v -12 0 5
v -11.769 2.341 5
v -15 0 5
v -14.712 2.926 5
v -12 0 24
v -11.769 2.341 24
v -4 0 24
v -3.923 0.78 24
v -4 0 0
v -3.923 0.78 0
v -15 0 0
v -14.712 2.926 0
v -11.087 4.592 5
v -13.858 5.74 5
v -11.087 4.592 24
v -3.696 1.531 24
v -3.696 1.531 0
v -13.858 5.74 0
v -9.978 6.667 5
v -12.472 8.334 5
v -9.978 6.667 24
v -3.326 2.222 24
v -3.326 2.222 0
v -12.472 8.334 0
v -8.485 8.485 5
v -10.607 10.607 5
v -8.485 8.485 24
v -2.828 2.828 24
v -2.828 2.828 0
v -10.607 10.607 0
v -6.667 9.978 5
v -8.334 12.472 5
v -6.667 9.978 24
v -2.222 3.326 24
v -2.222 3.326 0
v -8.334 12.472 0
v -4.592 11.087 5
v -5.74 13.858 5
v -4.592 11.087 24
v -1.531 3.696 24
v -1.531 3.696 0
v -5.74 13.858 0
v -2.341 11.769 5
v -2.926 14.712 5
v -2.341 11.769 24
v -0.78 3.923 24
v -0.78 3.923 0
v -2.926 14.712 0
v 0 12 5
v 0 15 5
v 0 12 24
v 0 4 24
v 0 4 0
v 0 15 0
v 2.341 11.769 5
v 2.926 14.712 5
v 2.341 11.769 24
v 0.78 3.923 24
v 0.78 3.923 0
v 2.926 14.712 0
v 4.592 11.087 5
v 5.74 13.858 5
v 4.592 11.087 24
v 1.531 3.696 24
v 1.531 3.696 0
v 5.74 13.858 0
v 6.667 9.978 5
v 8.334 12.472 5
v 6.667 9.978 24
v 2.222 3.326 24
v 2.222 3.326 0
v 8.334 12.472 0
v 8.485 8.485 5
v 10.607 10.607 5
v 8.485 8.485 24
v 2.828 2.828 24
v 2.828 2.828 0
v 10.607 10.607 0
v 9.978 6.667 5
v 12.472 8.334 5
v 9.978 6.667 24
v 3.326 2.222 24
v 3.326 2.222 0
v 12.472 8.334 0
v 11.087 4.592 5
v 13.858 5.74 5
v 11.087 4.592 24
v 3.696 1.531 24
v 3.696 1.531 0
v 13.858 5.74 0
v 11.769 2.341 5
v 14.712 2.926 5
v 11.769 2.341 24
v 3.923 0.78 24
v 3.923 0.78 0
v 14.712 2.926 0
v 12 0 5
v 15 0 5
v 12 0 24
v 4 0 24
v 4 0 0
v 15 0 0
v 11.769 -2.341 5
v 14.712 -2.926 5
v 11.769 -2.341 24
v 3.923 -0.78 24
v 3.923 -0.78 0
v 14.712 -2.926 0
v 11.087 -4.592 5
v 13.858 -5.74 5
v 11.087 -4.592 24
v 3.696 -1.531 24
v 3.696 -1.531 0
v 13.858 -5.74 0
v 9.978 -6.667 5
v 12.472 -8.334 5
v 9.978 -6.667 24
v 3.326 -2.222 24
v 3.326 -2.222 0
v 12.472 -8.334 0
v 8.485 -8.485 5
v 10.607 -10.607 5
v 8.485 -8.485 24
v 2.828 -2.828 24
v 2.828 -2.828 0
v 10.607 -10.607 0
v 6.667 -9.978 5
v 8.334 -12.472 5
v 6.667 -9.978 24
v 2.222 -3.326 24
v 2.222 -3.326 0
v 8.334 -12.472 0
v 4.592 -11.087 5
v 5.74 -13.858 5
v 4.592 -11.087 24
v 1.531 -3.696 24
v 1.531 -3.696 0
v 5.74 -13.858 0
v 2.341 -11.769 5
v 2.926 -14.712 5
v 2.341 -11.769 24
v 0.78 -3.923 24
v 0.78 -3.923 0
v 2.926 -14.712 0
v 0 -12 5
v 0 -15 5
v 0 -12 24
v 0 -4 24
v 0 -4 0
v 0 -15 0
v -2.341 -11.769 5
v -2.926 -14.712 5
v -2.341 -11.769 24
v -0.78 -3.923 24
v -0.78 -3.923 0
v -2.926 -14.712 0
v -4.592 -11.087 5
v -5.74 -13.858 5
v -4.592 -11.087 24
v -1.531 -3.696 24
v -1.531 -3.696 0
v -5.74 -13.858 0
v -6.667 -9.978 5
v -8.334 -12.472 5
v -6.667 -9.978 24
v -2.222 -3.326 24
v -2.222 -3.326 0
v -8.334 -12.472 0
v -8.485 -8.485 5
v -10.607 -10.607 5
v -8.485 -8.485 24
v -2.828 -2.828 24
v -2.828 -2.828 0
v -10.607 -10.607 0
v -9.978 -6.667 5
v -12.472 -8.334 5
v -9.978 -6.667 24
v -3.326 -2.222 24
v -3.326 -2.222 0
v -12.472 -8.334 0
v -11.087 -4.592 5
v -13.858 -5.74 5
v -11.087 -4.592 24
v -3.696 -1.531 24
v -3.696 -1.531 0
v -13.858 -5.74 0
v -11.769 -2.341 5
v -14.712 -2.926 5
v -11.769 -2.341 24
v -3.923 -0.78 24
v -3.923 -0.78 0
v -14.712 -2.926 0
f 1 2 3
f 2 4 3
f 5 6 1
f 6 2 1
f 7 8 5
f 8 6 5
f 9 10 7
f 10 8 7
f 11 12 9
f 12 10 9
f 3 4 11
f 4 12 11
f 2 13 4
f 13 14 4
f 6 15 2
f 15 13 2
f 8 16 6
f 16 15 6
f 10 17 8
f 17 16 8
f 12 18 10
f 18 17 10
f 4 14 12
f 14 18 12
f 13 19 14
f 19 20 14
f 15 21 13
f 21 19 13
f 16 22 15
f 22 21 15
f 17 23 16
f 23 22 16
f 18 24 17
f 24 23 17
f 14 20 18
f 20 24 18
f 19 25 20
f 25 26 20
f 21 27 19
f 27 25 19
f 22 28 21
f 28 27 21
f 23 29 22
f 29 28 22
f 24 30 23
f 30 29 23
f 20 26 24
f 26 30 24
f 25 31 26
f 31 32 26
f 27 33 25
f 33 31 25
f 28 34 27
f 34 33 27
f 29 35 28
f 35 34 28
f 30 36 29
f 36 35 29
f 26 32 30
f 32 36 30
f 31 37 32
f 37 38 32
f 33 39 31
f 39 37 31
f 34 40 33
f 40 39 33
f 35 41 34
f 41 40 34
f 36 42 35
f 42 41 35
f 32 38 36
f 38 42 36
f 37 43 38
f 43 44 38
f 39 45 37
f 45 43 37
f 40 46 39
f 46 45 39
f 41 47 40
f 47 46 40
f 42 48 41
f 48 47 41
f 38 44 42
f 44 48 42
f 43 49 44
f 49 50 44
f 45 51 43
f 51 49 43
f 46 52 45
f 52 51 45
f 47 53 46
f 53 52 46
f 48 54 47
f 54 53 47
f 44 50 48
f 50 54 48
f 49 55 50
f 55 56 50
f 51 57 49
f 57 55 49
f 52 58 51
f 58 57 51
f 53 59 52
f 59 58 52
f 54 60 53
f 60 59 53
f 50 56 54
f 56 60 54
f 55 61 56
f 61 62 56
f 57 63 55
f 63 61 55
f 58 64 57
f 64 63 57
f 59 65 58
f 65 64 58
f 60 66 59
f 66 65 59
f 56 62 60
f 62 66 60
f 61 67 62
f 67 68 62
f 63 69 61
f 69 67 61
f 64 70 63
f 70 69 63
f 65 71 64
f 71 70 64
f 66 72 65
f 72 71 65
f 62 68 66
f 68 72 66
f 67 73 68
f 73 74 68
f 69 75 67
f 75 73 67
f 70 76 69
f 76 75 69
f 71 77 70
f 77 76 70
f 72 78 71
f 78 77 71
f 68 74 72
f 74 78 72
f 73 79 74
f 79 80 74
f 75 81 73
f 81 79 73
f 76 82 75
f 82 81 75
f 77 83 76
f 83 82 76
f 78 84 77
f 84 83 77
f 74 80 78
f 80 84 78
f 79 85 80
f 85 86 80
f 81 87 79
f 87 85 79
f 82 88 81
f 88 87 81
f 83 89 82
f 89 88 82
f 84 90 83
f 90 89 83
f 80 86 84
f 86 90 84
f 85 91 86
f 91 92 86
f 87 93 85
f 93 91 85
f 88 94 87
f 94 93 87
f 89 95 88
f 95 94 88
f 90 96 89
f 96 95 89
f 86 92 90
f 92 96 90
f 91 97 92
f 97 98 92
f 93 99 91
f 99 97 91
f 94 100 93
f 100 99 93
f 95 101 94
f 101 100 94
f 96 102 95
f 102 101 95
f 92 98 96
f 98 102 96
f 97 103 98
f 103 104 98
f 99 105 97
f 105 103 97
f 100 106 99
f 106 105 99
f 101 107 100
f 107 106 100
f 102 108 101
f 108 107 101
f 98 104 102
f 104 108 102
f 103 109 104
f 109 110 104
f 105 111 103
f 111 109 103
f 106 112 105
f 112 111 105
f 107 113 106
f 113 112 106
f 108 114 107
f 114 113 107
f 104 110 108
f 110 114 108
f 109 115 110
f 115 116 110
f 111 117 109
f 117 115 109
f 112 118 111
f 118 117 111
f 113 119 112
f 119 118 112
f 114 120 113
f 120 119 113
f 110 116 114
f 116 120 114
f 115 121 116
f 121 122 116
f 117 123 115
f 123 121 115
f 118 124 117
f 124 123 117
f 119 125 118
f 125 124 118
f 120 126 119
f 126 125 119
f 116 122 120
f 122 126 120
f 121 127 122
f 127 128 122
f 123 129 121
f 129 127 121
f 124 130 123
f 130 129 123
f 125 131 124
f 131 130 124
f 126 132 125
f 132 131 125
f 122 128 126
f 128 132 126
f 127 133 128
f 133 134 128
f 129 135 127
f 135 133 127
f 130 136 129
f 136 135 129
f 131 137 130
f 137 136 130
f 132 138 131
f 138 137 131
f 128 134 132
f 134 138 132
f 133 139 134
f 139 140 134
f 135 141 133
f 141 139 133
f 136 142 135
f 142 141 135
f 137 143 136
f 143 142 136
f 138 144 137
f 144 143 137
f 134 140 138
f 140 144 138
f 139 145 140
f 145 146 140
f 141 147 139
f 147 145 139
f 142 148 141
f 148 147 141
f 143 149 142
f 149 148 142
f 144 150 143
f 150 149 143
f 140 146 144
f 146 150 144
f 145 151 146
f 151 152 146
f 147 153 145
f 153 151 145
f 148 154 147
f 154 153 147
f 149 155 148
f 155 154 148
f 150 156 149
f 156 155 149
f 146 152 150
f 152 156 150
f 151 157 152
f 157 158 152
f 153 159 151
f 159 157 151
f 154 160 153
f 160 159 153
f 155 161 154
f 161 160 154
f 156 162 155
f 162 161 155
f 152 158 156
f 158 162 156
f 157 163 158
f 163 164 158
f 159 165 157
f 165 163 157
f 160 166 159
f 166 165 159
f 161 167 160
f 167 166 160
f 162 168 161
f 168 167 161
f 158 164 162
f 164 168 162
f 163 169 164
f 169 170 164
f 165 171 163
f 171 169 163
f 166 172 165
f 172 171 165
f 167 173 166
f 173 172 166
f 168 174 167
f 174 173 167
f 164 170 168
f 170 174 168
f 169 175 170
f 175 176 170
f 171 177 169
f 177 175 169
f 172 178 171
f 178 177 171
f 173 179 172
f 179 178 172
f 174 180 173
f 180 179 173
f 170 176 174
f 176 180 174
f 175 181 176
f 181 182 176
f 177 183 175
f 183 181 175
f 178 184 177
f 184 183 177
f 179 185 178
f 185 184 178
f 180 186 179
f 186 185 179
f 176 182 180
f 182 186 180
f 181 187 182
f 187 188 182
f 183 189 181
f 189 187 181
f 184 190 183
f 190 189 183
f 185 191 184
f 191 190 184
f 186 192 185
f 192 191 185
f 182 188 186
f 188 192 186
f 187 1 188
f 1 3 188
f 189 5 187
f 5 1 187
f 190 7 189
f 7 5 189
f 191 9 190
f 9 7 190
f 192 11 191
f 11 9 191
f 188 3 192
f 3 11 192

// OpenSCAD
$fn = 32;

// ----------------------------------------------------------------------
// Arc stop: collar, 24 mm thick
// ----------------------------------------------------------------------

// --- parameters (mm) ---
revolve_angle = 360;      // full turn around the Z axis
profile_points = 6;       // points of the closed outline

profile = [[4, 0], [15, 0], [15, 5], [12, 5], [12, 24], [4, 24]];  // single closed polygon, 6 points, counter clockwise

// --- the one profile operation ---
rotate_extrude(angle = revolve_angle) polygon(points = profile);
